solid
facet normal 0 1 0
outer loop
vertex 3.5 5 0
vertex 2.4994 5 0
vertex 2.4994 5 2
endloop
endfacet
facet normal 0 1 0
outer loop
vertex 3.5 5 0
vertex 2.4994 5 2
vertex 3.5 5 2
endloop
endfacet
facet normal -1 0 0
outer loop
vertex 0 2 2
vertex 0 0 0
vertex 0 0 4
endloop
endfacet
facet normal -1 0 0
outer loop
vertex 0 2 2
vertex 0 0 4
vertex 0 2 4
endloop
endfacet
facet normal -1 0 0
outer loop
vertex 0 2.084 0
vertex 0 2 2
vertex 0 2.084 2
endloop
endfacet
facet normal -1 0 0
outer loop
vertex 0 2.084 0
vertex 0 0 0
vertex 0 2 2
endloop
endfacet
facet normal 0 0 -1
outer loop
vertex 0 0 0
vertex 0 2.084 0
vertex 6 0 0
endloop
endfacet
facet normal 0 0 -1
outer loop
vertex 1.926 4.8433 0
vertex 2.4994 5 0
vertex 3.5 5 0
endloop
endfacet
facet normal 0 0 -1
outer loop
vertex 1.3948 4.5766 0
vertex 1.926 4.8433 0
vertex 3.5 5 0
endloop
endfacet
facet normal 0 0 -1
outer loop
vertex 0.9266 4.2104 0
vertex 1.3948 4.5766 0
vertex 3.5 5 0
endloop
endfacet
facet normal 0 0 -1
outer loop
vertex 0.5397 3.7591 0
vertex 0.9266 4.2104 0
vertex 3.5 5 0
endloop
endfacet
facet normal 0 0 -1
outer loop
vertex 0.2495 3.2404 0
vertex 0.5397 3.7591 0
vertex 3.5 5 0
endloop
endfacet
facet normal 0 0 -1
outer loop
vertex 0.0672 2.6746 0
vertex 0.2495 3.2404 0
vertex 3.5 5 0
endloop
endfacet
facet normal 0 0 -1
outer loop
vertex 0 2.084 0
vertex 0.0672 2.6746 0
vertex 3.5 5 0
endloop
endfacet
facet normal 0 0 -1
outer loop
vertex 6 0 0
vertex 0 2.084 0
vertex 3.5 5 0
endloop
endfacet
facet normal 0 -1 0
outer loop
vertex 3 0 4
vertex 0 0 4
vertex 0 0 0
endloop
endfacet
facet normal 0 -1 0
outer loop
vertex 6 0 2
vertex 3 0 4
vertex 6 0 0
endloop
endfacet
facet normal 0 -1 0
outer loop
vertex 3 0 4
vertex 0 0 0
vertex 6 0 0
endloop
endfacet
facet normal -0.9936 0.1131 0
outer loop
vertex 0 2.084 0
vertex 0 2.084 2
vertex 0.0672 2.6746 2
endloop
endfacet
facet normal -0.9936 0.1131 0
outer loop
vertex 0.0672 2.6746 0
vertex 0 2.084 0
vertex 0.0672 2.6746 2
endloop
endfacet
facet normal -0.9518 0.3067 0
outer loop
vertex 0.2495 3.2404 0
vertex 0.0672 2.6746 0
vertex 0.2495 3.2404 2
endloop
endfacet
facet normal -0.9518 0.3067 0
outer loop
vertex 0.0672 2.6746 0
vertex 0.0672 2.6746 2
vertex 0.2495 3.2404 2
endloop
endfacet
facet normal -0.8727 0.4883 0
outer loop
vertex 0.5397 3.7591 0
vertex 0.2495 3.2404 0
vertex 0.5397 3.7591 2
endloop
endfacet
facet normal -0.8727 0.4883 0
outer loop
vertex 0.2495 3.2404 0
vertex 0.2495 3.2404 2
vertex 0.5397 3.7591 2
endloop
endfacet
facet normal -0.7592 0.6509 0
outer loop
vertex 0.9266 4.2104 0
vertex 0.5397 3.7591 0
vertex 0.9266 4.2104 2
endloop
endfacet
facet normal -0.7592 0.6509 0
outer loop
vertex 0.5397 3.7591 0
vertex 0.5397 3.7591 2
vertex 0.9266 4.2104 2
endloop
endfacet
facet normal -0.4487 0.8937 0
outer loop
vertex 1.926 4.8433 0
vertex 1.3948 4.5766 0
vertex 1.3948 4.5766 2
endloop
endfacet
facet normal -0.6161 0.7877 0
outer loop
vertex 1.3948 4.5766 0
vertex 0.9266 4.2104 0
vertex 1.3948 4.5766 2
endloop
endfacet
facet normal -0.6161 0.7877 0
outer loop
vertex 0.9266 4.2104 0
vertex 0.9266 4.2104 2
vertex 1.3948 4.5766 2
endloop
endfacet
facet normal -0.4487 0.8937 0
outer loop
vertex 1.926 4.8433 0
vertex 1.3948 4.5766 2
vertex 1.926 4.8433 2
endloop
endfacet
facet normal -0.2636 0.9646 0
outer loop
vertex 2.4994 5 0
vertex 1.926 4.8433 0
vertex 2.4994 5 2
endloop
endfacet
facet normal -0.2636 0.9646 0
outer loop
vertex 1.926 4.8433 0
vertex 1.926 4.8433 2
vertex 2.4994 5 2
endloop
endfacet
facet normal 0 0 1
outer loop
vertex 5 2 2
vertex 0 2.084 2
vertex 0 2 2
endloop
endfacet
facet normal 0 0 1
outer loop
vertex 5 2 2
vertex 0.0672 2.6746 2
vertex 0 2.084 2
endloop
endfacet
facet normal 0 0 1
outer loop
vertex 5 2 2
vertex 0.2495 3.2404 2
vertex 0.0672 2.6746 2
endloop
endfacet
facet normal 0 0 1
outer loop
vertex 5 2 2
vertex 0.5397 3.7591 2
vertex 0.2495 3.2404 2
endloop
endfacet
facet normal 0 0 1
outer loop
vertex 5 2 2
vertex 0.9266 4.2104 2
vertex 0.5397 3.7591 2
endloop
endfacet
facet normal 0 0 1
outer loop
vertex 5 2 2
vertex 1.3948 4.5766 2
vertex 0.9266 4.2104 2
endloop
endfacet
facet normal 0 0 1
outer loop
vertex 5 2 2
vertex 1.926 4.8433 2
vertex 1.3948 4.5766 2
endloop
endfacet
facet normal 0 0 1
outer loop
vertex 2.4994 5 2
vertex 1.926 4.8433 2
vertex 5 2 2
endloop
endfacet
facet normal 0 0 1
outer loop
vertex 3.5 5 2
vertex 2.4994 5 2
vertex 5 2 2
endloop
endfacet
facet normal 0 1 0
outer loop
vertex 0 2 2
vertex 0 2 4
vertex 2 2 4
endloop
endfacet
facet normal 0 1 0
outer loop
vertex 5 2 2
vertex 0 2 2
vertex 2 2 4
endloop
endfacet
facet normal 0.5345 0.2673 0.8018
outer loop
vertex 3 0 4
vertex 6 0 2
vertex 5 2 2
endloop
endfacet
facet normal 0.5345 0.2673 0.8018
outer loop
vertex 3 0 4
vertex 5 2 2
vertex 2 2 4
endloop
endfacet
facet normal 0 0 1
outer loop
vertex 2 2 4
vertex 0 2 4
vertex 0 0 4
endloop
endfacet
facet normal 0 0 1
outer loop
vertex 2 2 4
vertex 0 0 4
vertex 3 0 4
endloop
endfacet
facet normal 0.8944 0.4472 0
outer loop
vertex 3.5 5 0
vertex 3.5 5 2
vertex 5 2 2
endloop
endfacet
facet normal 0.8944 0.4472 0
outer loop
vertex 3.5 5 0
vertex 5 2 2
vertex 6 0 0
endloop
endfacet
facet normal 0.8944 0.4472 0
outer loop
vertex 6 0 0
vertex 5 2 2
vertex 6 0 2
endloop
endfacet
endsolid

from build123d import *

# Parameters (mm, degrees)
SKETCH1_W           = 6
SKETCH1_H           = 5
BOSS_EXTRUDE1_DEPTH = 2
SKETCH2_W           = 6
SKETCH2_H           = 2
BOSS_EXTRUDE2_DEPTH = 2
CUT_EXTRUDE1_DEPTH  = 10
CUT_EXTRUDE2_DEPTH  = 10
CUT_EXTRUDE3_DEPTH  = 10


with BuildPart() as part:
    # Sketch1 → Boss-Extrude1 (new body)
    with BuildSketch(Plane.XY):
        with Locations((3, 2.5)):
            Rectangle(SKETCH1_W, SKETCH1_H)
    extrude(amount=BOSS_EXTRUDE1_DEPTH)

    # Sketch2 → Boss-Extrude2 (add)
    with BuildSketch(Plane.XY.offset(2)):
        with Locations((3, 1)):
            Rectangle(SKETCH2_W, SKETCH2_H)
    extrude(amount=BOSS_EXTRUDE2_DEPTH)

    # 3DSketch1 → Cut-Extrude1 (cut, along a direction that is not the sketch's normal)
    with BuildSketch(Plane(origin=(6, 0, 2), x_dir=(-0.816496580927726, 0.4082482904638629, 0.40824829046386285), z_dir=(-0.5345224838248487, -0.26726124191242434, -0.8017837257372732))):
        Polygon((0, 0), (3.265986324, -1.527525232), (4.898979486, 0), (1.632993162, 1.527525232), align=None)
    extrude(amount=-CUT_EXTRUDE1_DEPTH, dir=(-1, 0, 0), mode=Mode.SUBTRACT)

    # Sketch3 → Cut-Extrude2 (cut)
    with BuildSketch(Plane.XY.offset(2)):
        Polygon((6, 0), (5, 2), (3.5, 5), (6, 5), align=None)
    extrude(amount=-CUT_EXTRUDE2_DEPTH, mode=Mode.SUBTRACT)

    # Sketch4 → Cut-Extrude3 (cut)
    with BuildSketch(Plane.XY.offset(2)):
        with BuildLine():
            ThreePointArc((0, 2.084019689), (0.721936041, 3.994383965), (2.499411695, 5))
            Line((2.499411695, 5), (0, 5))
            Line((0, 5), (0, 2.084019689))
        make_face()
    extrude(amount=-CUT_EXTRUDE3_DEPTH, mode=Mode.SUBTRACT)


solid = part.part
